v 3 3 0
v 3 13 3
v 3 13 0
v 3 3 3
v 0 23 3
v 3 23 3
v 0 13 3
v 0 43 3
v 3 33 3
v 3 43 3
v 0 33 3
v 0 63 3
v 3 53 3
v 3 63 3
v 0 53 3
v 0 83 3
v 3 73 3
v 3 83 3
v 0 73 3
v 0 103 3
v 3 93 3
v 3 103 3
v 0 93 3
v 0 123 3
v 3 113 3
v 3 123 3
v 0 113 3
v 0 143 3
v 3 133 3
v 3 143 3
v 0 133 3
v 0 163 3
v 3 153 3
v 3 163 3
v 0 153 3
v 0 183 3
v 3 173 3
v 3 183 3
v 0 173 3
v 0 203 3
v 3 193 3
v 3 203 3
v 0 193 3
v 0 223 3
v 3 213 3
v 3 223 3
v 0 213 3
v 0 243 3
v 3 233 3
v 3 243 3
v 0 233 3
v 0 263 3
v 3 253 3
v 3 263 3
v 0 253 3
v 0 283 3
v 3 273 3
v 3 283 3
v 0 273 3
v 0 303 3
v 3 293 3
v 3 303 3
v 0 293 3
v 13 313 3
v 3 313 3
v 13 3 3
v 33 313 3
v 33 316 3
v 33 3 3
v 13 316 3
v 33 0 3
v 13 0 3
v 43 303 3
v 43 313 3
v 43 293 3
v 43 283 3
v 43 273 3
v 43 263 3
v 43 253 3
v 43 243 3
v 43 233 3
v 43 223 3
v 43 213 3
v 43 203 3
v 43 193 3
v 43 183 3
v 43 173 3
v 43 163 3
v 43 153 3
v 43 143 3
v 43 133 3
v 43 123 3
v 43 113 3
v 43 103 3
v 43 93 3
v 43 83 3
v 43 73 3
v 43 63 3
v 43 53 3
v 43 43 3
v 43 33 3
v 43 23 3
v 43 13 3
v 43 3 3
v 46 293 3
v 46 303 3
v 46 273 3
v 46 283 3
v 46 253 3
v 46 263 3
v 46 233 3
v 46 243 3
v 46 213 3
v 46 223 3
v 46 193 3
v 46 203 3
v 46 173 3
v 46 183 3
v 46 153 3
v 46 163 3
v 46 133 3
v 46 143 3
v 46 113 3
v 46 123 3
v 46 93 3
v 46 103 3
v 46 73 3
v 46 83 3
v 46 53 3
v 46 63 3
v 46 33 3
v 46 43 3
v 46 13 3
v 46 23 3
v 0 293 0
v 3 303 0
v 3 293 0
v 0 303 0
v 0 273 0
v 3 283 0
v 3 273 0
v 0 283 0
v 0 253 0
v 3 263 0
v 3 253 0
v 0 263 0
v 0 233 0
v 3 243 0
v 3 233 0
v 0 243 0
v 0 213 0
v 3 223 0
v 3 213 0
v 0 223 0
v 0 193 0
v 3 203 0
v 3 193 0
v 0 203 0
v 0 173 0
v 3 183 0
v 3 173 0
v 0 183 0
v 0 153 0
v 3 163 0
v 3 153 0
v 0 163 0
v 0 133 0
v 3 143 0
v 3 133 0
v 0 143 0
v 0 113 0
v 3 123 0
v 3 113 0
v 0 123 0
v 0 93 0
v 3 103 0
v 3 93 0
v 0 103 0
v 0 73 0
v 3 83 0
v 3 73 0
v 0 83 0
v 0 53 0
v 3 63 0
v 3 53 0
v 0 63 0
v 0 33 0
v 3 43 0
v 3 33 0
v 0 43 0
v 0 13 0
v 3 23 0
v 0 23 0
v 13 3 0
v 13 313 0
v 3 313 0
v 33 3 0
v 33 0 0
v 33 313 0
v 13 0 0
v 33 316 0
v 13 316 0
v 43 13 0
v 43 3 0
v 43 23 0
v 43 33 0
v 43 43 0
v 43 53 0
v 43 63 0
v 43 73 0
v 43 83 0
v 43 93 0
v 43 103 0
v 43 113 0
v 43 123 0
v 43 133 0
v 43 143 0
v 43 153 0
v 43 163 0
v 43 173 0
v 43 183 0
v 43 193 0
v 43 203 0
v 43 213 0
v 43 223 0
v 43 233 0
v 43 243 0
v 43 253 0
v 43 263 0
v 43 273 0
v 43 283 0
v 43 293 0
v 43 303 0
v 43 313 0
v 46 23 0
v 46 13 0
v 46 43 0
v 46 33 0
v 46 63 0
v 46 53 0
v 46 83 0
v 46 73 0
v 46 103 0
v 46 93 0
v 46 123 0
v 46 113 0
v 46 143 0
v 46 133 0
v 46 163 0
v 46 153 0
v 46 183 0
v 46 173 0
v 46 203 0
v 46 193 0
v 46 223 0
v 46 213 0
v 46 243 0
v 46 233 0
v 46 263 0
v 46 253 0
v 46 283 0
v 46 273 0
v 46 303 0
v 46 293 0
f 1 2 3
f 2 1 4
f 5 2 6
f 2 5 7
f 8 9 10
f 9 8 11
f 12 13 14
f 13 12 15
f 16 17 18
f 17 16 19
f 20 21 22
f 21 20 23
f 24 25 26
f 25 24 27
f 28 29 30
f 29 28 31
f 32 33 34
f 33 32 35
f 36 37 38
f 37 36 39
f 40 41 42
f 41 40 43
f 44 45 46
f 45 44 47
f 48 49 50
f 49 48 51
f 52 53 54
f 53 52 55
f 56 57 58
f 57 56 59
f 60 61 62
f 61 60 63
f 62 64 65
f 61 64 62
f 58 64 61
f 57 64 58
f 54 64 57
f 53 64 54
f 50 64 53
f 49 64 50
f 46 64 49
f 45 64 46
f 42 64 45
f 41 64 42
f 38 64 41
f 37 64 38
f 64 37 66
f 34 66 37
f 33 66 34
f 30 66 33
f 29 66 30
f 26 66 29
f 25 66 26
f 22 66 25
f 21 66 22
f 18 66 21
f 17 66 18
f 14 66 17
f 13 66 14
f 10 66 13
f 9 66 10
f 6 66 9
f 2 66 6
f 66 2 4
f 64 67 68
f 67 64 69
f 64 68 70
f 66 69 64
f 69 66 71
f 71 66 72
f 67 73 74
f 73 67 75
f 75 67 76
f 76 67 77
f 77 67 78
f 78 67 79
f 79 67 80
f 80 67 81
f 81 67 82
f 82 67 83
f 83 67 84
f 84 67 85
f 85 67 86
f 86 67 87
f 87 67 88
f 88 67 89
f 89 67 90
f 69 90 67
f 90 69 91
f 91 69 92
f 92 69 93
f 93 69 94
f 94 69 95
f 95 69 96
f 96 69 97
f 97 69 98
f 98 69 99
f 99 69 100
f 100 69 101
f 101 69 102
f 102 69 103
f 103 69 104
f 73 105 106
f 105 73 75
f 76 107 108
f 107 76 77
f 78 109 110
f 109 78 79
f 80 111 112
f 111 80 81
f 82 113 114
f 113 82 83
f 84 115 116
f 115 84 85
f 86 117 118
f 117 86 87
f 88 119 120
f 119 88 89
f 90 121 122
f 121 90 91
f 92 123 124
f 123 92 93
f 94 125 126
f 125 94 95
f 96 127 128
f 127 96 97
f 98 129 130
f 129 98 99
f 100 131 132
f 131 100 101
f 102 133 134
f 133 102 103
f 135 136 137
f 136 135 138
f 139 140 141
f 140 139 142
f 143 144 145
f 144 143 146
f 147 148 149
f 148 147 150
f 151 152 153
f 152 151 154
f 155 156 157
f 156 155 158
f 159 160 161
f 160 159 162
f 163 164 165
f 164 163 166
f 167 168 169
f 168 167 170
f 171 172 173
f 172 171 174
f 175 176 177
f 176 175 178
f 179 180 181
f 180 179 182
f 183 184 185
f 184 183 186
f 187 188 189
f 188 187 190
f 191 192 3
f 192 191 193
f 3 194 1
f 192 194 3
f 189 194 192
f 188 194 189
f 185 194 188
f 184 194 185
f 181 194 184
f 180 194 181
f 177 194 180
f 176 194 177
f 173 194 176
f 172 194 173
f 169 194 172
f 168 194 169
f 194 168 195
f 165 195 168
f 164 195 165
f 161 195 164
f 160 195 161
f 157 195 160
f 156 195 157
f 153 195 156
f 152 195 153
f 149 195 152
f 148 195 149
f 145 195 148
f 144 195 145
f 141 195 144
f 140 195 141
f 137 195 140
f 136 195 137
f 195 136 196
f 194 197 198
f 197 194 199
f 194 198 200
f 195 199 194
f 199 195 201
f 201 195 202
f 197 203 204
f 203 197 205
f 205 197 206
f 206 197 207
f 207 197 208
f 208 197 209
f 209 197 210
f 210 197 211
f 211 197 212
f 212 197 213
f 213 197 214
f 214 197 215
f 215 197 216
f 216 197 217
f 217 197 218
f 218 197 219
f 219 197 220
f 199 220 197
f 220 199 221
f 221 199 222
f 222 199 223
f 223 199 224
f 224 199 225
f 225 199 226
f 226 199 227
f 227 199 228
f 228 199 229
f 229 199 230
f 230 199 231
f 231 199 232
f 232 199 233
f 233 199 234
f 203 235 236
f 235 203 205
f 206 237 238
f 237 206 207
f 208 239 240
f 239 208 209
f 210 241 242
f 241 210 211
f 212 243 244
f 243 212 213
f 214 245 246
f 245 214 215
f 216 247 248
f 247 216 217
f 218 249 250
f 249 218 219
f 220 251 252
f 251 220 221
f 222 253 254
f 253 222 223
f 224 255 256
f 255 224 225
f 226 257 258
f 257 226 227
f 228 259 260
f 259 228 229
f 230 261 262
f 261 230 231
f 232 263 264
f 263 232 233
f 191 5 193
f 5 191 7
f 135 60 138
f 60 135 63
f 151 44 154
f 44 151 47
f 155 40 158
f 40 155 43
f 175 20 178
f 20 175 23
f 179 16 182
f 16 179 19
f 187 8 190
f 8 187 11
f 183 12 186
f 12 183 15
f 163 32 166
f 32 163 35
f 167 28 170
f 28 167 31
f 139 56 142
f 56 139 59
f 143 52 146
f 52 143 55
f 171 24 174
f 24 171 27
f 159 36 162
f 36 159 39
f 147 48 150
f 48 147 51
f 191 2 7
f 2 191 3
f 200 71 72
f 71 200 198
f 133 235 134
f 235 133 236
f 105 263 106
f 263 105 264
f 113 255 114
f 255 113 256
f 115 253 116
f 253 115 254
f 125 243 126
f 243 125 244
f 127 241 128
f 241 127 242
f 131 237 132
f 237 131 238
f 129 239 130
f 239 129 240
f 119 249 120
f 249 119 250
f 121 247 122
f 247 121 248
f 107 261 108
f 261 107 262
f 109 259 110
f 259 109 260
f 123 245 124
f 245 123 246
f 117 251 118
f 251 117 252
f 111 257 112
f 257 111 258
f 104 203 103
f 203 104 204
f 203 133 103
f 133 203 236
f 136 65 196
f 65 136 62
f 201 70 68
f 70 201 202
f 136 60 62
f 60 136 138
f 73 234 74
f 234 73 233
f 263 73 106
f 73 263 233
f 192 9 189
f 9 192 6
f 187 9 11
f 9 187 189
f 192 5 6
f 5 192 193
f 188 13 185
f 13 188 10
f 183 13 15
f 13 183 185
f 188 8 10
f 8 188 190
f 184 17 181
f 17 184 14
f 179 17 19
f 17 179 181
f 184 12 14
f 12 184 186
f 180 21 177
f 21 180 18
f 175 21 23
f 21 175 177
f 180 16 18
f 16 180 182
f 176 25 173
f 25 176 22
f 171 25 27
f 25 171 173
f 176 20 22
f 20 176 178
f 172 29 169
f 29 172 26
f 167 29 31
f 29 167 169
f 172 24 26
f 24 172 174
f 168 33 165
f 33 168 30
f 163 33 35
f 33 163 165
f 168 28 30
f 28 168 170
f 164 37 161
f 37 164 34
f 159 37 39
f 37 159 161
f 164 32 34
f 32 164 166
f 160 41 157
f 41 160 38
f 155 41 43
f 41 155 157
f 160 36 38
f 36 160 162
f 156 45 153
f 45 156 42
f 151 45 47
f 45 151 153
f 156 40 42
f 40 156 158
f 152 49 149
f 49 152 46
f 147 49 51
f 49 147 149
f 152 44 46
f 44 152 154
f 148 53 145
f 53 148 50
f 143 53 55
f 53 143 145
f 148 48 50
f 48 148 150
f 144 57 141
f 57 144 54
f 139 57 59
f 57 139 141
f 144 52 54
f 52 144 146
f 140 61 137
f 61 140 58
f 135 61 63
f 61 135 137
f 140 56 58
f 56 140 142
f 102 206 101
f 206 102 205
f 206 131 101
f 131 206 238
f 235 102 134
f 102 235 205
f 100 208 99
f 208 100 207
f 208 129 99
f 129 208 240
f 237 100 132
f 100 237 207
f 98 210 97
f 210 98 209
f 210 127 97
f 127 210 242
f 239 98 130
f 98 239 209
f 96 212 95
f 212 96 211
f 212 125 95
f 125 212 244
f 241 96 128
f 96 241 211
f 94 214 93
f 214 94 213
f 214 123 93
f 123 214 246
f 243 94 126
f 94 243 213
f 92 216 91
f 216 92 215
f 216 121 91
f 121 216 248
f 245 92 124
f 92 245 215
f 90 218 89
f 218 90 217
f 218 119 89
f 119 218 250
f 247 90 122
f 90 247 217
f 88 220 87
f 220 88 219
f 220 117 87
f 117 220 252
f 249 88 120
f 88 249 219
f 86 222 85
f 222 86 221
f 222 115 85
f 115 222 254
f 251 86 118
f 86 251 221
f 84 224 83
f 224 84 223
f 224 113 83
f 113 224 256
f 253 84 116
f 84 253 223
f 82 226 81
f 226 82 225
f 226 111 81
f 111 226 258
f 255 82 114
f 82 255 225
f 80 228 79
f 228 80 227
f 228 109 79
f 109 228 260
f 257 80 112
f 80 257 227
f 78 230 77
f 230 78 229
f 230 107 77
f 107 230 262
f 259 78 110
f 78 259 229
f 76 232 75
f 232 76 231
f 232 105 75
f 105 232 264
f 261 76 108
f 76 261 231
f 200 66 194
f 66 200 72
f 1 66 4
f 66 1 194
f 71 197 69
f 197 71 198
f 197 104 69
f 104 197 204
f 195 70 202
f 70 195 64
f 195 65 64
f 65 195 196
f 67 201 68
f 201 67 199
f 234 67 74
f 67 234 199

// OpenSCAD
module leftside()
{
	difference()
	{
		cube([46,316,3]);
		lefttap();
	}
}
module lefttap()
{
	for ( i = [0 : 1] )
	{
		translate([0,303*i,0])cube([3,13,3]);
		translate([43,303*i,0])cube([3,13,3]);
	}
	translate([0,3,0])
	union()
	{
		for ( j = [0 : 1] )
		{
			for ( i = [1 : 14] )
			{
				translate([43*j,20*i,0])cube([3,10,3]);
			}
		}
	}
	for ( j = [0 : 1] )
	{
		translate([0,313*j,0])cube([13,3,3]);
		translate([33,313*j,0])cube([13,3,3]);
	}
}

//projection(cut=true)
leftside();
